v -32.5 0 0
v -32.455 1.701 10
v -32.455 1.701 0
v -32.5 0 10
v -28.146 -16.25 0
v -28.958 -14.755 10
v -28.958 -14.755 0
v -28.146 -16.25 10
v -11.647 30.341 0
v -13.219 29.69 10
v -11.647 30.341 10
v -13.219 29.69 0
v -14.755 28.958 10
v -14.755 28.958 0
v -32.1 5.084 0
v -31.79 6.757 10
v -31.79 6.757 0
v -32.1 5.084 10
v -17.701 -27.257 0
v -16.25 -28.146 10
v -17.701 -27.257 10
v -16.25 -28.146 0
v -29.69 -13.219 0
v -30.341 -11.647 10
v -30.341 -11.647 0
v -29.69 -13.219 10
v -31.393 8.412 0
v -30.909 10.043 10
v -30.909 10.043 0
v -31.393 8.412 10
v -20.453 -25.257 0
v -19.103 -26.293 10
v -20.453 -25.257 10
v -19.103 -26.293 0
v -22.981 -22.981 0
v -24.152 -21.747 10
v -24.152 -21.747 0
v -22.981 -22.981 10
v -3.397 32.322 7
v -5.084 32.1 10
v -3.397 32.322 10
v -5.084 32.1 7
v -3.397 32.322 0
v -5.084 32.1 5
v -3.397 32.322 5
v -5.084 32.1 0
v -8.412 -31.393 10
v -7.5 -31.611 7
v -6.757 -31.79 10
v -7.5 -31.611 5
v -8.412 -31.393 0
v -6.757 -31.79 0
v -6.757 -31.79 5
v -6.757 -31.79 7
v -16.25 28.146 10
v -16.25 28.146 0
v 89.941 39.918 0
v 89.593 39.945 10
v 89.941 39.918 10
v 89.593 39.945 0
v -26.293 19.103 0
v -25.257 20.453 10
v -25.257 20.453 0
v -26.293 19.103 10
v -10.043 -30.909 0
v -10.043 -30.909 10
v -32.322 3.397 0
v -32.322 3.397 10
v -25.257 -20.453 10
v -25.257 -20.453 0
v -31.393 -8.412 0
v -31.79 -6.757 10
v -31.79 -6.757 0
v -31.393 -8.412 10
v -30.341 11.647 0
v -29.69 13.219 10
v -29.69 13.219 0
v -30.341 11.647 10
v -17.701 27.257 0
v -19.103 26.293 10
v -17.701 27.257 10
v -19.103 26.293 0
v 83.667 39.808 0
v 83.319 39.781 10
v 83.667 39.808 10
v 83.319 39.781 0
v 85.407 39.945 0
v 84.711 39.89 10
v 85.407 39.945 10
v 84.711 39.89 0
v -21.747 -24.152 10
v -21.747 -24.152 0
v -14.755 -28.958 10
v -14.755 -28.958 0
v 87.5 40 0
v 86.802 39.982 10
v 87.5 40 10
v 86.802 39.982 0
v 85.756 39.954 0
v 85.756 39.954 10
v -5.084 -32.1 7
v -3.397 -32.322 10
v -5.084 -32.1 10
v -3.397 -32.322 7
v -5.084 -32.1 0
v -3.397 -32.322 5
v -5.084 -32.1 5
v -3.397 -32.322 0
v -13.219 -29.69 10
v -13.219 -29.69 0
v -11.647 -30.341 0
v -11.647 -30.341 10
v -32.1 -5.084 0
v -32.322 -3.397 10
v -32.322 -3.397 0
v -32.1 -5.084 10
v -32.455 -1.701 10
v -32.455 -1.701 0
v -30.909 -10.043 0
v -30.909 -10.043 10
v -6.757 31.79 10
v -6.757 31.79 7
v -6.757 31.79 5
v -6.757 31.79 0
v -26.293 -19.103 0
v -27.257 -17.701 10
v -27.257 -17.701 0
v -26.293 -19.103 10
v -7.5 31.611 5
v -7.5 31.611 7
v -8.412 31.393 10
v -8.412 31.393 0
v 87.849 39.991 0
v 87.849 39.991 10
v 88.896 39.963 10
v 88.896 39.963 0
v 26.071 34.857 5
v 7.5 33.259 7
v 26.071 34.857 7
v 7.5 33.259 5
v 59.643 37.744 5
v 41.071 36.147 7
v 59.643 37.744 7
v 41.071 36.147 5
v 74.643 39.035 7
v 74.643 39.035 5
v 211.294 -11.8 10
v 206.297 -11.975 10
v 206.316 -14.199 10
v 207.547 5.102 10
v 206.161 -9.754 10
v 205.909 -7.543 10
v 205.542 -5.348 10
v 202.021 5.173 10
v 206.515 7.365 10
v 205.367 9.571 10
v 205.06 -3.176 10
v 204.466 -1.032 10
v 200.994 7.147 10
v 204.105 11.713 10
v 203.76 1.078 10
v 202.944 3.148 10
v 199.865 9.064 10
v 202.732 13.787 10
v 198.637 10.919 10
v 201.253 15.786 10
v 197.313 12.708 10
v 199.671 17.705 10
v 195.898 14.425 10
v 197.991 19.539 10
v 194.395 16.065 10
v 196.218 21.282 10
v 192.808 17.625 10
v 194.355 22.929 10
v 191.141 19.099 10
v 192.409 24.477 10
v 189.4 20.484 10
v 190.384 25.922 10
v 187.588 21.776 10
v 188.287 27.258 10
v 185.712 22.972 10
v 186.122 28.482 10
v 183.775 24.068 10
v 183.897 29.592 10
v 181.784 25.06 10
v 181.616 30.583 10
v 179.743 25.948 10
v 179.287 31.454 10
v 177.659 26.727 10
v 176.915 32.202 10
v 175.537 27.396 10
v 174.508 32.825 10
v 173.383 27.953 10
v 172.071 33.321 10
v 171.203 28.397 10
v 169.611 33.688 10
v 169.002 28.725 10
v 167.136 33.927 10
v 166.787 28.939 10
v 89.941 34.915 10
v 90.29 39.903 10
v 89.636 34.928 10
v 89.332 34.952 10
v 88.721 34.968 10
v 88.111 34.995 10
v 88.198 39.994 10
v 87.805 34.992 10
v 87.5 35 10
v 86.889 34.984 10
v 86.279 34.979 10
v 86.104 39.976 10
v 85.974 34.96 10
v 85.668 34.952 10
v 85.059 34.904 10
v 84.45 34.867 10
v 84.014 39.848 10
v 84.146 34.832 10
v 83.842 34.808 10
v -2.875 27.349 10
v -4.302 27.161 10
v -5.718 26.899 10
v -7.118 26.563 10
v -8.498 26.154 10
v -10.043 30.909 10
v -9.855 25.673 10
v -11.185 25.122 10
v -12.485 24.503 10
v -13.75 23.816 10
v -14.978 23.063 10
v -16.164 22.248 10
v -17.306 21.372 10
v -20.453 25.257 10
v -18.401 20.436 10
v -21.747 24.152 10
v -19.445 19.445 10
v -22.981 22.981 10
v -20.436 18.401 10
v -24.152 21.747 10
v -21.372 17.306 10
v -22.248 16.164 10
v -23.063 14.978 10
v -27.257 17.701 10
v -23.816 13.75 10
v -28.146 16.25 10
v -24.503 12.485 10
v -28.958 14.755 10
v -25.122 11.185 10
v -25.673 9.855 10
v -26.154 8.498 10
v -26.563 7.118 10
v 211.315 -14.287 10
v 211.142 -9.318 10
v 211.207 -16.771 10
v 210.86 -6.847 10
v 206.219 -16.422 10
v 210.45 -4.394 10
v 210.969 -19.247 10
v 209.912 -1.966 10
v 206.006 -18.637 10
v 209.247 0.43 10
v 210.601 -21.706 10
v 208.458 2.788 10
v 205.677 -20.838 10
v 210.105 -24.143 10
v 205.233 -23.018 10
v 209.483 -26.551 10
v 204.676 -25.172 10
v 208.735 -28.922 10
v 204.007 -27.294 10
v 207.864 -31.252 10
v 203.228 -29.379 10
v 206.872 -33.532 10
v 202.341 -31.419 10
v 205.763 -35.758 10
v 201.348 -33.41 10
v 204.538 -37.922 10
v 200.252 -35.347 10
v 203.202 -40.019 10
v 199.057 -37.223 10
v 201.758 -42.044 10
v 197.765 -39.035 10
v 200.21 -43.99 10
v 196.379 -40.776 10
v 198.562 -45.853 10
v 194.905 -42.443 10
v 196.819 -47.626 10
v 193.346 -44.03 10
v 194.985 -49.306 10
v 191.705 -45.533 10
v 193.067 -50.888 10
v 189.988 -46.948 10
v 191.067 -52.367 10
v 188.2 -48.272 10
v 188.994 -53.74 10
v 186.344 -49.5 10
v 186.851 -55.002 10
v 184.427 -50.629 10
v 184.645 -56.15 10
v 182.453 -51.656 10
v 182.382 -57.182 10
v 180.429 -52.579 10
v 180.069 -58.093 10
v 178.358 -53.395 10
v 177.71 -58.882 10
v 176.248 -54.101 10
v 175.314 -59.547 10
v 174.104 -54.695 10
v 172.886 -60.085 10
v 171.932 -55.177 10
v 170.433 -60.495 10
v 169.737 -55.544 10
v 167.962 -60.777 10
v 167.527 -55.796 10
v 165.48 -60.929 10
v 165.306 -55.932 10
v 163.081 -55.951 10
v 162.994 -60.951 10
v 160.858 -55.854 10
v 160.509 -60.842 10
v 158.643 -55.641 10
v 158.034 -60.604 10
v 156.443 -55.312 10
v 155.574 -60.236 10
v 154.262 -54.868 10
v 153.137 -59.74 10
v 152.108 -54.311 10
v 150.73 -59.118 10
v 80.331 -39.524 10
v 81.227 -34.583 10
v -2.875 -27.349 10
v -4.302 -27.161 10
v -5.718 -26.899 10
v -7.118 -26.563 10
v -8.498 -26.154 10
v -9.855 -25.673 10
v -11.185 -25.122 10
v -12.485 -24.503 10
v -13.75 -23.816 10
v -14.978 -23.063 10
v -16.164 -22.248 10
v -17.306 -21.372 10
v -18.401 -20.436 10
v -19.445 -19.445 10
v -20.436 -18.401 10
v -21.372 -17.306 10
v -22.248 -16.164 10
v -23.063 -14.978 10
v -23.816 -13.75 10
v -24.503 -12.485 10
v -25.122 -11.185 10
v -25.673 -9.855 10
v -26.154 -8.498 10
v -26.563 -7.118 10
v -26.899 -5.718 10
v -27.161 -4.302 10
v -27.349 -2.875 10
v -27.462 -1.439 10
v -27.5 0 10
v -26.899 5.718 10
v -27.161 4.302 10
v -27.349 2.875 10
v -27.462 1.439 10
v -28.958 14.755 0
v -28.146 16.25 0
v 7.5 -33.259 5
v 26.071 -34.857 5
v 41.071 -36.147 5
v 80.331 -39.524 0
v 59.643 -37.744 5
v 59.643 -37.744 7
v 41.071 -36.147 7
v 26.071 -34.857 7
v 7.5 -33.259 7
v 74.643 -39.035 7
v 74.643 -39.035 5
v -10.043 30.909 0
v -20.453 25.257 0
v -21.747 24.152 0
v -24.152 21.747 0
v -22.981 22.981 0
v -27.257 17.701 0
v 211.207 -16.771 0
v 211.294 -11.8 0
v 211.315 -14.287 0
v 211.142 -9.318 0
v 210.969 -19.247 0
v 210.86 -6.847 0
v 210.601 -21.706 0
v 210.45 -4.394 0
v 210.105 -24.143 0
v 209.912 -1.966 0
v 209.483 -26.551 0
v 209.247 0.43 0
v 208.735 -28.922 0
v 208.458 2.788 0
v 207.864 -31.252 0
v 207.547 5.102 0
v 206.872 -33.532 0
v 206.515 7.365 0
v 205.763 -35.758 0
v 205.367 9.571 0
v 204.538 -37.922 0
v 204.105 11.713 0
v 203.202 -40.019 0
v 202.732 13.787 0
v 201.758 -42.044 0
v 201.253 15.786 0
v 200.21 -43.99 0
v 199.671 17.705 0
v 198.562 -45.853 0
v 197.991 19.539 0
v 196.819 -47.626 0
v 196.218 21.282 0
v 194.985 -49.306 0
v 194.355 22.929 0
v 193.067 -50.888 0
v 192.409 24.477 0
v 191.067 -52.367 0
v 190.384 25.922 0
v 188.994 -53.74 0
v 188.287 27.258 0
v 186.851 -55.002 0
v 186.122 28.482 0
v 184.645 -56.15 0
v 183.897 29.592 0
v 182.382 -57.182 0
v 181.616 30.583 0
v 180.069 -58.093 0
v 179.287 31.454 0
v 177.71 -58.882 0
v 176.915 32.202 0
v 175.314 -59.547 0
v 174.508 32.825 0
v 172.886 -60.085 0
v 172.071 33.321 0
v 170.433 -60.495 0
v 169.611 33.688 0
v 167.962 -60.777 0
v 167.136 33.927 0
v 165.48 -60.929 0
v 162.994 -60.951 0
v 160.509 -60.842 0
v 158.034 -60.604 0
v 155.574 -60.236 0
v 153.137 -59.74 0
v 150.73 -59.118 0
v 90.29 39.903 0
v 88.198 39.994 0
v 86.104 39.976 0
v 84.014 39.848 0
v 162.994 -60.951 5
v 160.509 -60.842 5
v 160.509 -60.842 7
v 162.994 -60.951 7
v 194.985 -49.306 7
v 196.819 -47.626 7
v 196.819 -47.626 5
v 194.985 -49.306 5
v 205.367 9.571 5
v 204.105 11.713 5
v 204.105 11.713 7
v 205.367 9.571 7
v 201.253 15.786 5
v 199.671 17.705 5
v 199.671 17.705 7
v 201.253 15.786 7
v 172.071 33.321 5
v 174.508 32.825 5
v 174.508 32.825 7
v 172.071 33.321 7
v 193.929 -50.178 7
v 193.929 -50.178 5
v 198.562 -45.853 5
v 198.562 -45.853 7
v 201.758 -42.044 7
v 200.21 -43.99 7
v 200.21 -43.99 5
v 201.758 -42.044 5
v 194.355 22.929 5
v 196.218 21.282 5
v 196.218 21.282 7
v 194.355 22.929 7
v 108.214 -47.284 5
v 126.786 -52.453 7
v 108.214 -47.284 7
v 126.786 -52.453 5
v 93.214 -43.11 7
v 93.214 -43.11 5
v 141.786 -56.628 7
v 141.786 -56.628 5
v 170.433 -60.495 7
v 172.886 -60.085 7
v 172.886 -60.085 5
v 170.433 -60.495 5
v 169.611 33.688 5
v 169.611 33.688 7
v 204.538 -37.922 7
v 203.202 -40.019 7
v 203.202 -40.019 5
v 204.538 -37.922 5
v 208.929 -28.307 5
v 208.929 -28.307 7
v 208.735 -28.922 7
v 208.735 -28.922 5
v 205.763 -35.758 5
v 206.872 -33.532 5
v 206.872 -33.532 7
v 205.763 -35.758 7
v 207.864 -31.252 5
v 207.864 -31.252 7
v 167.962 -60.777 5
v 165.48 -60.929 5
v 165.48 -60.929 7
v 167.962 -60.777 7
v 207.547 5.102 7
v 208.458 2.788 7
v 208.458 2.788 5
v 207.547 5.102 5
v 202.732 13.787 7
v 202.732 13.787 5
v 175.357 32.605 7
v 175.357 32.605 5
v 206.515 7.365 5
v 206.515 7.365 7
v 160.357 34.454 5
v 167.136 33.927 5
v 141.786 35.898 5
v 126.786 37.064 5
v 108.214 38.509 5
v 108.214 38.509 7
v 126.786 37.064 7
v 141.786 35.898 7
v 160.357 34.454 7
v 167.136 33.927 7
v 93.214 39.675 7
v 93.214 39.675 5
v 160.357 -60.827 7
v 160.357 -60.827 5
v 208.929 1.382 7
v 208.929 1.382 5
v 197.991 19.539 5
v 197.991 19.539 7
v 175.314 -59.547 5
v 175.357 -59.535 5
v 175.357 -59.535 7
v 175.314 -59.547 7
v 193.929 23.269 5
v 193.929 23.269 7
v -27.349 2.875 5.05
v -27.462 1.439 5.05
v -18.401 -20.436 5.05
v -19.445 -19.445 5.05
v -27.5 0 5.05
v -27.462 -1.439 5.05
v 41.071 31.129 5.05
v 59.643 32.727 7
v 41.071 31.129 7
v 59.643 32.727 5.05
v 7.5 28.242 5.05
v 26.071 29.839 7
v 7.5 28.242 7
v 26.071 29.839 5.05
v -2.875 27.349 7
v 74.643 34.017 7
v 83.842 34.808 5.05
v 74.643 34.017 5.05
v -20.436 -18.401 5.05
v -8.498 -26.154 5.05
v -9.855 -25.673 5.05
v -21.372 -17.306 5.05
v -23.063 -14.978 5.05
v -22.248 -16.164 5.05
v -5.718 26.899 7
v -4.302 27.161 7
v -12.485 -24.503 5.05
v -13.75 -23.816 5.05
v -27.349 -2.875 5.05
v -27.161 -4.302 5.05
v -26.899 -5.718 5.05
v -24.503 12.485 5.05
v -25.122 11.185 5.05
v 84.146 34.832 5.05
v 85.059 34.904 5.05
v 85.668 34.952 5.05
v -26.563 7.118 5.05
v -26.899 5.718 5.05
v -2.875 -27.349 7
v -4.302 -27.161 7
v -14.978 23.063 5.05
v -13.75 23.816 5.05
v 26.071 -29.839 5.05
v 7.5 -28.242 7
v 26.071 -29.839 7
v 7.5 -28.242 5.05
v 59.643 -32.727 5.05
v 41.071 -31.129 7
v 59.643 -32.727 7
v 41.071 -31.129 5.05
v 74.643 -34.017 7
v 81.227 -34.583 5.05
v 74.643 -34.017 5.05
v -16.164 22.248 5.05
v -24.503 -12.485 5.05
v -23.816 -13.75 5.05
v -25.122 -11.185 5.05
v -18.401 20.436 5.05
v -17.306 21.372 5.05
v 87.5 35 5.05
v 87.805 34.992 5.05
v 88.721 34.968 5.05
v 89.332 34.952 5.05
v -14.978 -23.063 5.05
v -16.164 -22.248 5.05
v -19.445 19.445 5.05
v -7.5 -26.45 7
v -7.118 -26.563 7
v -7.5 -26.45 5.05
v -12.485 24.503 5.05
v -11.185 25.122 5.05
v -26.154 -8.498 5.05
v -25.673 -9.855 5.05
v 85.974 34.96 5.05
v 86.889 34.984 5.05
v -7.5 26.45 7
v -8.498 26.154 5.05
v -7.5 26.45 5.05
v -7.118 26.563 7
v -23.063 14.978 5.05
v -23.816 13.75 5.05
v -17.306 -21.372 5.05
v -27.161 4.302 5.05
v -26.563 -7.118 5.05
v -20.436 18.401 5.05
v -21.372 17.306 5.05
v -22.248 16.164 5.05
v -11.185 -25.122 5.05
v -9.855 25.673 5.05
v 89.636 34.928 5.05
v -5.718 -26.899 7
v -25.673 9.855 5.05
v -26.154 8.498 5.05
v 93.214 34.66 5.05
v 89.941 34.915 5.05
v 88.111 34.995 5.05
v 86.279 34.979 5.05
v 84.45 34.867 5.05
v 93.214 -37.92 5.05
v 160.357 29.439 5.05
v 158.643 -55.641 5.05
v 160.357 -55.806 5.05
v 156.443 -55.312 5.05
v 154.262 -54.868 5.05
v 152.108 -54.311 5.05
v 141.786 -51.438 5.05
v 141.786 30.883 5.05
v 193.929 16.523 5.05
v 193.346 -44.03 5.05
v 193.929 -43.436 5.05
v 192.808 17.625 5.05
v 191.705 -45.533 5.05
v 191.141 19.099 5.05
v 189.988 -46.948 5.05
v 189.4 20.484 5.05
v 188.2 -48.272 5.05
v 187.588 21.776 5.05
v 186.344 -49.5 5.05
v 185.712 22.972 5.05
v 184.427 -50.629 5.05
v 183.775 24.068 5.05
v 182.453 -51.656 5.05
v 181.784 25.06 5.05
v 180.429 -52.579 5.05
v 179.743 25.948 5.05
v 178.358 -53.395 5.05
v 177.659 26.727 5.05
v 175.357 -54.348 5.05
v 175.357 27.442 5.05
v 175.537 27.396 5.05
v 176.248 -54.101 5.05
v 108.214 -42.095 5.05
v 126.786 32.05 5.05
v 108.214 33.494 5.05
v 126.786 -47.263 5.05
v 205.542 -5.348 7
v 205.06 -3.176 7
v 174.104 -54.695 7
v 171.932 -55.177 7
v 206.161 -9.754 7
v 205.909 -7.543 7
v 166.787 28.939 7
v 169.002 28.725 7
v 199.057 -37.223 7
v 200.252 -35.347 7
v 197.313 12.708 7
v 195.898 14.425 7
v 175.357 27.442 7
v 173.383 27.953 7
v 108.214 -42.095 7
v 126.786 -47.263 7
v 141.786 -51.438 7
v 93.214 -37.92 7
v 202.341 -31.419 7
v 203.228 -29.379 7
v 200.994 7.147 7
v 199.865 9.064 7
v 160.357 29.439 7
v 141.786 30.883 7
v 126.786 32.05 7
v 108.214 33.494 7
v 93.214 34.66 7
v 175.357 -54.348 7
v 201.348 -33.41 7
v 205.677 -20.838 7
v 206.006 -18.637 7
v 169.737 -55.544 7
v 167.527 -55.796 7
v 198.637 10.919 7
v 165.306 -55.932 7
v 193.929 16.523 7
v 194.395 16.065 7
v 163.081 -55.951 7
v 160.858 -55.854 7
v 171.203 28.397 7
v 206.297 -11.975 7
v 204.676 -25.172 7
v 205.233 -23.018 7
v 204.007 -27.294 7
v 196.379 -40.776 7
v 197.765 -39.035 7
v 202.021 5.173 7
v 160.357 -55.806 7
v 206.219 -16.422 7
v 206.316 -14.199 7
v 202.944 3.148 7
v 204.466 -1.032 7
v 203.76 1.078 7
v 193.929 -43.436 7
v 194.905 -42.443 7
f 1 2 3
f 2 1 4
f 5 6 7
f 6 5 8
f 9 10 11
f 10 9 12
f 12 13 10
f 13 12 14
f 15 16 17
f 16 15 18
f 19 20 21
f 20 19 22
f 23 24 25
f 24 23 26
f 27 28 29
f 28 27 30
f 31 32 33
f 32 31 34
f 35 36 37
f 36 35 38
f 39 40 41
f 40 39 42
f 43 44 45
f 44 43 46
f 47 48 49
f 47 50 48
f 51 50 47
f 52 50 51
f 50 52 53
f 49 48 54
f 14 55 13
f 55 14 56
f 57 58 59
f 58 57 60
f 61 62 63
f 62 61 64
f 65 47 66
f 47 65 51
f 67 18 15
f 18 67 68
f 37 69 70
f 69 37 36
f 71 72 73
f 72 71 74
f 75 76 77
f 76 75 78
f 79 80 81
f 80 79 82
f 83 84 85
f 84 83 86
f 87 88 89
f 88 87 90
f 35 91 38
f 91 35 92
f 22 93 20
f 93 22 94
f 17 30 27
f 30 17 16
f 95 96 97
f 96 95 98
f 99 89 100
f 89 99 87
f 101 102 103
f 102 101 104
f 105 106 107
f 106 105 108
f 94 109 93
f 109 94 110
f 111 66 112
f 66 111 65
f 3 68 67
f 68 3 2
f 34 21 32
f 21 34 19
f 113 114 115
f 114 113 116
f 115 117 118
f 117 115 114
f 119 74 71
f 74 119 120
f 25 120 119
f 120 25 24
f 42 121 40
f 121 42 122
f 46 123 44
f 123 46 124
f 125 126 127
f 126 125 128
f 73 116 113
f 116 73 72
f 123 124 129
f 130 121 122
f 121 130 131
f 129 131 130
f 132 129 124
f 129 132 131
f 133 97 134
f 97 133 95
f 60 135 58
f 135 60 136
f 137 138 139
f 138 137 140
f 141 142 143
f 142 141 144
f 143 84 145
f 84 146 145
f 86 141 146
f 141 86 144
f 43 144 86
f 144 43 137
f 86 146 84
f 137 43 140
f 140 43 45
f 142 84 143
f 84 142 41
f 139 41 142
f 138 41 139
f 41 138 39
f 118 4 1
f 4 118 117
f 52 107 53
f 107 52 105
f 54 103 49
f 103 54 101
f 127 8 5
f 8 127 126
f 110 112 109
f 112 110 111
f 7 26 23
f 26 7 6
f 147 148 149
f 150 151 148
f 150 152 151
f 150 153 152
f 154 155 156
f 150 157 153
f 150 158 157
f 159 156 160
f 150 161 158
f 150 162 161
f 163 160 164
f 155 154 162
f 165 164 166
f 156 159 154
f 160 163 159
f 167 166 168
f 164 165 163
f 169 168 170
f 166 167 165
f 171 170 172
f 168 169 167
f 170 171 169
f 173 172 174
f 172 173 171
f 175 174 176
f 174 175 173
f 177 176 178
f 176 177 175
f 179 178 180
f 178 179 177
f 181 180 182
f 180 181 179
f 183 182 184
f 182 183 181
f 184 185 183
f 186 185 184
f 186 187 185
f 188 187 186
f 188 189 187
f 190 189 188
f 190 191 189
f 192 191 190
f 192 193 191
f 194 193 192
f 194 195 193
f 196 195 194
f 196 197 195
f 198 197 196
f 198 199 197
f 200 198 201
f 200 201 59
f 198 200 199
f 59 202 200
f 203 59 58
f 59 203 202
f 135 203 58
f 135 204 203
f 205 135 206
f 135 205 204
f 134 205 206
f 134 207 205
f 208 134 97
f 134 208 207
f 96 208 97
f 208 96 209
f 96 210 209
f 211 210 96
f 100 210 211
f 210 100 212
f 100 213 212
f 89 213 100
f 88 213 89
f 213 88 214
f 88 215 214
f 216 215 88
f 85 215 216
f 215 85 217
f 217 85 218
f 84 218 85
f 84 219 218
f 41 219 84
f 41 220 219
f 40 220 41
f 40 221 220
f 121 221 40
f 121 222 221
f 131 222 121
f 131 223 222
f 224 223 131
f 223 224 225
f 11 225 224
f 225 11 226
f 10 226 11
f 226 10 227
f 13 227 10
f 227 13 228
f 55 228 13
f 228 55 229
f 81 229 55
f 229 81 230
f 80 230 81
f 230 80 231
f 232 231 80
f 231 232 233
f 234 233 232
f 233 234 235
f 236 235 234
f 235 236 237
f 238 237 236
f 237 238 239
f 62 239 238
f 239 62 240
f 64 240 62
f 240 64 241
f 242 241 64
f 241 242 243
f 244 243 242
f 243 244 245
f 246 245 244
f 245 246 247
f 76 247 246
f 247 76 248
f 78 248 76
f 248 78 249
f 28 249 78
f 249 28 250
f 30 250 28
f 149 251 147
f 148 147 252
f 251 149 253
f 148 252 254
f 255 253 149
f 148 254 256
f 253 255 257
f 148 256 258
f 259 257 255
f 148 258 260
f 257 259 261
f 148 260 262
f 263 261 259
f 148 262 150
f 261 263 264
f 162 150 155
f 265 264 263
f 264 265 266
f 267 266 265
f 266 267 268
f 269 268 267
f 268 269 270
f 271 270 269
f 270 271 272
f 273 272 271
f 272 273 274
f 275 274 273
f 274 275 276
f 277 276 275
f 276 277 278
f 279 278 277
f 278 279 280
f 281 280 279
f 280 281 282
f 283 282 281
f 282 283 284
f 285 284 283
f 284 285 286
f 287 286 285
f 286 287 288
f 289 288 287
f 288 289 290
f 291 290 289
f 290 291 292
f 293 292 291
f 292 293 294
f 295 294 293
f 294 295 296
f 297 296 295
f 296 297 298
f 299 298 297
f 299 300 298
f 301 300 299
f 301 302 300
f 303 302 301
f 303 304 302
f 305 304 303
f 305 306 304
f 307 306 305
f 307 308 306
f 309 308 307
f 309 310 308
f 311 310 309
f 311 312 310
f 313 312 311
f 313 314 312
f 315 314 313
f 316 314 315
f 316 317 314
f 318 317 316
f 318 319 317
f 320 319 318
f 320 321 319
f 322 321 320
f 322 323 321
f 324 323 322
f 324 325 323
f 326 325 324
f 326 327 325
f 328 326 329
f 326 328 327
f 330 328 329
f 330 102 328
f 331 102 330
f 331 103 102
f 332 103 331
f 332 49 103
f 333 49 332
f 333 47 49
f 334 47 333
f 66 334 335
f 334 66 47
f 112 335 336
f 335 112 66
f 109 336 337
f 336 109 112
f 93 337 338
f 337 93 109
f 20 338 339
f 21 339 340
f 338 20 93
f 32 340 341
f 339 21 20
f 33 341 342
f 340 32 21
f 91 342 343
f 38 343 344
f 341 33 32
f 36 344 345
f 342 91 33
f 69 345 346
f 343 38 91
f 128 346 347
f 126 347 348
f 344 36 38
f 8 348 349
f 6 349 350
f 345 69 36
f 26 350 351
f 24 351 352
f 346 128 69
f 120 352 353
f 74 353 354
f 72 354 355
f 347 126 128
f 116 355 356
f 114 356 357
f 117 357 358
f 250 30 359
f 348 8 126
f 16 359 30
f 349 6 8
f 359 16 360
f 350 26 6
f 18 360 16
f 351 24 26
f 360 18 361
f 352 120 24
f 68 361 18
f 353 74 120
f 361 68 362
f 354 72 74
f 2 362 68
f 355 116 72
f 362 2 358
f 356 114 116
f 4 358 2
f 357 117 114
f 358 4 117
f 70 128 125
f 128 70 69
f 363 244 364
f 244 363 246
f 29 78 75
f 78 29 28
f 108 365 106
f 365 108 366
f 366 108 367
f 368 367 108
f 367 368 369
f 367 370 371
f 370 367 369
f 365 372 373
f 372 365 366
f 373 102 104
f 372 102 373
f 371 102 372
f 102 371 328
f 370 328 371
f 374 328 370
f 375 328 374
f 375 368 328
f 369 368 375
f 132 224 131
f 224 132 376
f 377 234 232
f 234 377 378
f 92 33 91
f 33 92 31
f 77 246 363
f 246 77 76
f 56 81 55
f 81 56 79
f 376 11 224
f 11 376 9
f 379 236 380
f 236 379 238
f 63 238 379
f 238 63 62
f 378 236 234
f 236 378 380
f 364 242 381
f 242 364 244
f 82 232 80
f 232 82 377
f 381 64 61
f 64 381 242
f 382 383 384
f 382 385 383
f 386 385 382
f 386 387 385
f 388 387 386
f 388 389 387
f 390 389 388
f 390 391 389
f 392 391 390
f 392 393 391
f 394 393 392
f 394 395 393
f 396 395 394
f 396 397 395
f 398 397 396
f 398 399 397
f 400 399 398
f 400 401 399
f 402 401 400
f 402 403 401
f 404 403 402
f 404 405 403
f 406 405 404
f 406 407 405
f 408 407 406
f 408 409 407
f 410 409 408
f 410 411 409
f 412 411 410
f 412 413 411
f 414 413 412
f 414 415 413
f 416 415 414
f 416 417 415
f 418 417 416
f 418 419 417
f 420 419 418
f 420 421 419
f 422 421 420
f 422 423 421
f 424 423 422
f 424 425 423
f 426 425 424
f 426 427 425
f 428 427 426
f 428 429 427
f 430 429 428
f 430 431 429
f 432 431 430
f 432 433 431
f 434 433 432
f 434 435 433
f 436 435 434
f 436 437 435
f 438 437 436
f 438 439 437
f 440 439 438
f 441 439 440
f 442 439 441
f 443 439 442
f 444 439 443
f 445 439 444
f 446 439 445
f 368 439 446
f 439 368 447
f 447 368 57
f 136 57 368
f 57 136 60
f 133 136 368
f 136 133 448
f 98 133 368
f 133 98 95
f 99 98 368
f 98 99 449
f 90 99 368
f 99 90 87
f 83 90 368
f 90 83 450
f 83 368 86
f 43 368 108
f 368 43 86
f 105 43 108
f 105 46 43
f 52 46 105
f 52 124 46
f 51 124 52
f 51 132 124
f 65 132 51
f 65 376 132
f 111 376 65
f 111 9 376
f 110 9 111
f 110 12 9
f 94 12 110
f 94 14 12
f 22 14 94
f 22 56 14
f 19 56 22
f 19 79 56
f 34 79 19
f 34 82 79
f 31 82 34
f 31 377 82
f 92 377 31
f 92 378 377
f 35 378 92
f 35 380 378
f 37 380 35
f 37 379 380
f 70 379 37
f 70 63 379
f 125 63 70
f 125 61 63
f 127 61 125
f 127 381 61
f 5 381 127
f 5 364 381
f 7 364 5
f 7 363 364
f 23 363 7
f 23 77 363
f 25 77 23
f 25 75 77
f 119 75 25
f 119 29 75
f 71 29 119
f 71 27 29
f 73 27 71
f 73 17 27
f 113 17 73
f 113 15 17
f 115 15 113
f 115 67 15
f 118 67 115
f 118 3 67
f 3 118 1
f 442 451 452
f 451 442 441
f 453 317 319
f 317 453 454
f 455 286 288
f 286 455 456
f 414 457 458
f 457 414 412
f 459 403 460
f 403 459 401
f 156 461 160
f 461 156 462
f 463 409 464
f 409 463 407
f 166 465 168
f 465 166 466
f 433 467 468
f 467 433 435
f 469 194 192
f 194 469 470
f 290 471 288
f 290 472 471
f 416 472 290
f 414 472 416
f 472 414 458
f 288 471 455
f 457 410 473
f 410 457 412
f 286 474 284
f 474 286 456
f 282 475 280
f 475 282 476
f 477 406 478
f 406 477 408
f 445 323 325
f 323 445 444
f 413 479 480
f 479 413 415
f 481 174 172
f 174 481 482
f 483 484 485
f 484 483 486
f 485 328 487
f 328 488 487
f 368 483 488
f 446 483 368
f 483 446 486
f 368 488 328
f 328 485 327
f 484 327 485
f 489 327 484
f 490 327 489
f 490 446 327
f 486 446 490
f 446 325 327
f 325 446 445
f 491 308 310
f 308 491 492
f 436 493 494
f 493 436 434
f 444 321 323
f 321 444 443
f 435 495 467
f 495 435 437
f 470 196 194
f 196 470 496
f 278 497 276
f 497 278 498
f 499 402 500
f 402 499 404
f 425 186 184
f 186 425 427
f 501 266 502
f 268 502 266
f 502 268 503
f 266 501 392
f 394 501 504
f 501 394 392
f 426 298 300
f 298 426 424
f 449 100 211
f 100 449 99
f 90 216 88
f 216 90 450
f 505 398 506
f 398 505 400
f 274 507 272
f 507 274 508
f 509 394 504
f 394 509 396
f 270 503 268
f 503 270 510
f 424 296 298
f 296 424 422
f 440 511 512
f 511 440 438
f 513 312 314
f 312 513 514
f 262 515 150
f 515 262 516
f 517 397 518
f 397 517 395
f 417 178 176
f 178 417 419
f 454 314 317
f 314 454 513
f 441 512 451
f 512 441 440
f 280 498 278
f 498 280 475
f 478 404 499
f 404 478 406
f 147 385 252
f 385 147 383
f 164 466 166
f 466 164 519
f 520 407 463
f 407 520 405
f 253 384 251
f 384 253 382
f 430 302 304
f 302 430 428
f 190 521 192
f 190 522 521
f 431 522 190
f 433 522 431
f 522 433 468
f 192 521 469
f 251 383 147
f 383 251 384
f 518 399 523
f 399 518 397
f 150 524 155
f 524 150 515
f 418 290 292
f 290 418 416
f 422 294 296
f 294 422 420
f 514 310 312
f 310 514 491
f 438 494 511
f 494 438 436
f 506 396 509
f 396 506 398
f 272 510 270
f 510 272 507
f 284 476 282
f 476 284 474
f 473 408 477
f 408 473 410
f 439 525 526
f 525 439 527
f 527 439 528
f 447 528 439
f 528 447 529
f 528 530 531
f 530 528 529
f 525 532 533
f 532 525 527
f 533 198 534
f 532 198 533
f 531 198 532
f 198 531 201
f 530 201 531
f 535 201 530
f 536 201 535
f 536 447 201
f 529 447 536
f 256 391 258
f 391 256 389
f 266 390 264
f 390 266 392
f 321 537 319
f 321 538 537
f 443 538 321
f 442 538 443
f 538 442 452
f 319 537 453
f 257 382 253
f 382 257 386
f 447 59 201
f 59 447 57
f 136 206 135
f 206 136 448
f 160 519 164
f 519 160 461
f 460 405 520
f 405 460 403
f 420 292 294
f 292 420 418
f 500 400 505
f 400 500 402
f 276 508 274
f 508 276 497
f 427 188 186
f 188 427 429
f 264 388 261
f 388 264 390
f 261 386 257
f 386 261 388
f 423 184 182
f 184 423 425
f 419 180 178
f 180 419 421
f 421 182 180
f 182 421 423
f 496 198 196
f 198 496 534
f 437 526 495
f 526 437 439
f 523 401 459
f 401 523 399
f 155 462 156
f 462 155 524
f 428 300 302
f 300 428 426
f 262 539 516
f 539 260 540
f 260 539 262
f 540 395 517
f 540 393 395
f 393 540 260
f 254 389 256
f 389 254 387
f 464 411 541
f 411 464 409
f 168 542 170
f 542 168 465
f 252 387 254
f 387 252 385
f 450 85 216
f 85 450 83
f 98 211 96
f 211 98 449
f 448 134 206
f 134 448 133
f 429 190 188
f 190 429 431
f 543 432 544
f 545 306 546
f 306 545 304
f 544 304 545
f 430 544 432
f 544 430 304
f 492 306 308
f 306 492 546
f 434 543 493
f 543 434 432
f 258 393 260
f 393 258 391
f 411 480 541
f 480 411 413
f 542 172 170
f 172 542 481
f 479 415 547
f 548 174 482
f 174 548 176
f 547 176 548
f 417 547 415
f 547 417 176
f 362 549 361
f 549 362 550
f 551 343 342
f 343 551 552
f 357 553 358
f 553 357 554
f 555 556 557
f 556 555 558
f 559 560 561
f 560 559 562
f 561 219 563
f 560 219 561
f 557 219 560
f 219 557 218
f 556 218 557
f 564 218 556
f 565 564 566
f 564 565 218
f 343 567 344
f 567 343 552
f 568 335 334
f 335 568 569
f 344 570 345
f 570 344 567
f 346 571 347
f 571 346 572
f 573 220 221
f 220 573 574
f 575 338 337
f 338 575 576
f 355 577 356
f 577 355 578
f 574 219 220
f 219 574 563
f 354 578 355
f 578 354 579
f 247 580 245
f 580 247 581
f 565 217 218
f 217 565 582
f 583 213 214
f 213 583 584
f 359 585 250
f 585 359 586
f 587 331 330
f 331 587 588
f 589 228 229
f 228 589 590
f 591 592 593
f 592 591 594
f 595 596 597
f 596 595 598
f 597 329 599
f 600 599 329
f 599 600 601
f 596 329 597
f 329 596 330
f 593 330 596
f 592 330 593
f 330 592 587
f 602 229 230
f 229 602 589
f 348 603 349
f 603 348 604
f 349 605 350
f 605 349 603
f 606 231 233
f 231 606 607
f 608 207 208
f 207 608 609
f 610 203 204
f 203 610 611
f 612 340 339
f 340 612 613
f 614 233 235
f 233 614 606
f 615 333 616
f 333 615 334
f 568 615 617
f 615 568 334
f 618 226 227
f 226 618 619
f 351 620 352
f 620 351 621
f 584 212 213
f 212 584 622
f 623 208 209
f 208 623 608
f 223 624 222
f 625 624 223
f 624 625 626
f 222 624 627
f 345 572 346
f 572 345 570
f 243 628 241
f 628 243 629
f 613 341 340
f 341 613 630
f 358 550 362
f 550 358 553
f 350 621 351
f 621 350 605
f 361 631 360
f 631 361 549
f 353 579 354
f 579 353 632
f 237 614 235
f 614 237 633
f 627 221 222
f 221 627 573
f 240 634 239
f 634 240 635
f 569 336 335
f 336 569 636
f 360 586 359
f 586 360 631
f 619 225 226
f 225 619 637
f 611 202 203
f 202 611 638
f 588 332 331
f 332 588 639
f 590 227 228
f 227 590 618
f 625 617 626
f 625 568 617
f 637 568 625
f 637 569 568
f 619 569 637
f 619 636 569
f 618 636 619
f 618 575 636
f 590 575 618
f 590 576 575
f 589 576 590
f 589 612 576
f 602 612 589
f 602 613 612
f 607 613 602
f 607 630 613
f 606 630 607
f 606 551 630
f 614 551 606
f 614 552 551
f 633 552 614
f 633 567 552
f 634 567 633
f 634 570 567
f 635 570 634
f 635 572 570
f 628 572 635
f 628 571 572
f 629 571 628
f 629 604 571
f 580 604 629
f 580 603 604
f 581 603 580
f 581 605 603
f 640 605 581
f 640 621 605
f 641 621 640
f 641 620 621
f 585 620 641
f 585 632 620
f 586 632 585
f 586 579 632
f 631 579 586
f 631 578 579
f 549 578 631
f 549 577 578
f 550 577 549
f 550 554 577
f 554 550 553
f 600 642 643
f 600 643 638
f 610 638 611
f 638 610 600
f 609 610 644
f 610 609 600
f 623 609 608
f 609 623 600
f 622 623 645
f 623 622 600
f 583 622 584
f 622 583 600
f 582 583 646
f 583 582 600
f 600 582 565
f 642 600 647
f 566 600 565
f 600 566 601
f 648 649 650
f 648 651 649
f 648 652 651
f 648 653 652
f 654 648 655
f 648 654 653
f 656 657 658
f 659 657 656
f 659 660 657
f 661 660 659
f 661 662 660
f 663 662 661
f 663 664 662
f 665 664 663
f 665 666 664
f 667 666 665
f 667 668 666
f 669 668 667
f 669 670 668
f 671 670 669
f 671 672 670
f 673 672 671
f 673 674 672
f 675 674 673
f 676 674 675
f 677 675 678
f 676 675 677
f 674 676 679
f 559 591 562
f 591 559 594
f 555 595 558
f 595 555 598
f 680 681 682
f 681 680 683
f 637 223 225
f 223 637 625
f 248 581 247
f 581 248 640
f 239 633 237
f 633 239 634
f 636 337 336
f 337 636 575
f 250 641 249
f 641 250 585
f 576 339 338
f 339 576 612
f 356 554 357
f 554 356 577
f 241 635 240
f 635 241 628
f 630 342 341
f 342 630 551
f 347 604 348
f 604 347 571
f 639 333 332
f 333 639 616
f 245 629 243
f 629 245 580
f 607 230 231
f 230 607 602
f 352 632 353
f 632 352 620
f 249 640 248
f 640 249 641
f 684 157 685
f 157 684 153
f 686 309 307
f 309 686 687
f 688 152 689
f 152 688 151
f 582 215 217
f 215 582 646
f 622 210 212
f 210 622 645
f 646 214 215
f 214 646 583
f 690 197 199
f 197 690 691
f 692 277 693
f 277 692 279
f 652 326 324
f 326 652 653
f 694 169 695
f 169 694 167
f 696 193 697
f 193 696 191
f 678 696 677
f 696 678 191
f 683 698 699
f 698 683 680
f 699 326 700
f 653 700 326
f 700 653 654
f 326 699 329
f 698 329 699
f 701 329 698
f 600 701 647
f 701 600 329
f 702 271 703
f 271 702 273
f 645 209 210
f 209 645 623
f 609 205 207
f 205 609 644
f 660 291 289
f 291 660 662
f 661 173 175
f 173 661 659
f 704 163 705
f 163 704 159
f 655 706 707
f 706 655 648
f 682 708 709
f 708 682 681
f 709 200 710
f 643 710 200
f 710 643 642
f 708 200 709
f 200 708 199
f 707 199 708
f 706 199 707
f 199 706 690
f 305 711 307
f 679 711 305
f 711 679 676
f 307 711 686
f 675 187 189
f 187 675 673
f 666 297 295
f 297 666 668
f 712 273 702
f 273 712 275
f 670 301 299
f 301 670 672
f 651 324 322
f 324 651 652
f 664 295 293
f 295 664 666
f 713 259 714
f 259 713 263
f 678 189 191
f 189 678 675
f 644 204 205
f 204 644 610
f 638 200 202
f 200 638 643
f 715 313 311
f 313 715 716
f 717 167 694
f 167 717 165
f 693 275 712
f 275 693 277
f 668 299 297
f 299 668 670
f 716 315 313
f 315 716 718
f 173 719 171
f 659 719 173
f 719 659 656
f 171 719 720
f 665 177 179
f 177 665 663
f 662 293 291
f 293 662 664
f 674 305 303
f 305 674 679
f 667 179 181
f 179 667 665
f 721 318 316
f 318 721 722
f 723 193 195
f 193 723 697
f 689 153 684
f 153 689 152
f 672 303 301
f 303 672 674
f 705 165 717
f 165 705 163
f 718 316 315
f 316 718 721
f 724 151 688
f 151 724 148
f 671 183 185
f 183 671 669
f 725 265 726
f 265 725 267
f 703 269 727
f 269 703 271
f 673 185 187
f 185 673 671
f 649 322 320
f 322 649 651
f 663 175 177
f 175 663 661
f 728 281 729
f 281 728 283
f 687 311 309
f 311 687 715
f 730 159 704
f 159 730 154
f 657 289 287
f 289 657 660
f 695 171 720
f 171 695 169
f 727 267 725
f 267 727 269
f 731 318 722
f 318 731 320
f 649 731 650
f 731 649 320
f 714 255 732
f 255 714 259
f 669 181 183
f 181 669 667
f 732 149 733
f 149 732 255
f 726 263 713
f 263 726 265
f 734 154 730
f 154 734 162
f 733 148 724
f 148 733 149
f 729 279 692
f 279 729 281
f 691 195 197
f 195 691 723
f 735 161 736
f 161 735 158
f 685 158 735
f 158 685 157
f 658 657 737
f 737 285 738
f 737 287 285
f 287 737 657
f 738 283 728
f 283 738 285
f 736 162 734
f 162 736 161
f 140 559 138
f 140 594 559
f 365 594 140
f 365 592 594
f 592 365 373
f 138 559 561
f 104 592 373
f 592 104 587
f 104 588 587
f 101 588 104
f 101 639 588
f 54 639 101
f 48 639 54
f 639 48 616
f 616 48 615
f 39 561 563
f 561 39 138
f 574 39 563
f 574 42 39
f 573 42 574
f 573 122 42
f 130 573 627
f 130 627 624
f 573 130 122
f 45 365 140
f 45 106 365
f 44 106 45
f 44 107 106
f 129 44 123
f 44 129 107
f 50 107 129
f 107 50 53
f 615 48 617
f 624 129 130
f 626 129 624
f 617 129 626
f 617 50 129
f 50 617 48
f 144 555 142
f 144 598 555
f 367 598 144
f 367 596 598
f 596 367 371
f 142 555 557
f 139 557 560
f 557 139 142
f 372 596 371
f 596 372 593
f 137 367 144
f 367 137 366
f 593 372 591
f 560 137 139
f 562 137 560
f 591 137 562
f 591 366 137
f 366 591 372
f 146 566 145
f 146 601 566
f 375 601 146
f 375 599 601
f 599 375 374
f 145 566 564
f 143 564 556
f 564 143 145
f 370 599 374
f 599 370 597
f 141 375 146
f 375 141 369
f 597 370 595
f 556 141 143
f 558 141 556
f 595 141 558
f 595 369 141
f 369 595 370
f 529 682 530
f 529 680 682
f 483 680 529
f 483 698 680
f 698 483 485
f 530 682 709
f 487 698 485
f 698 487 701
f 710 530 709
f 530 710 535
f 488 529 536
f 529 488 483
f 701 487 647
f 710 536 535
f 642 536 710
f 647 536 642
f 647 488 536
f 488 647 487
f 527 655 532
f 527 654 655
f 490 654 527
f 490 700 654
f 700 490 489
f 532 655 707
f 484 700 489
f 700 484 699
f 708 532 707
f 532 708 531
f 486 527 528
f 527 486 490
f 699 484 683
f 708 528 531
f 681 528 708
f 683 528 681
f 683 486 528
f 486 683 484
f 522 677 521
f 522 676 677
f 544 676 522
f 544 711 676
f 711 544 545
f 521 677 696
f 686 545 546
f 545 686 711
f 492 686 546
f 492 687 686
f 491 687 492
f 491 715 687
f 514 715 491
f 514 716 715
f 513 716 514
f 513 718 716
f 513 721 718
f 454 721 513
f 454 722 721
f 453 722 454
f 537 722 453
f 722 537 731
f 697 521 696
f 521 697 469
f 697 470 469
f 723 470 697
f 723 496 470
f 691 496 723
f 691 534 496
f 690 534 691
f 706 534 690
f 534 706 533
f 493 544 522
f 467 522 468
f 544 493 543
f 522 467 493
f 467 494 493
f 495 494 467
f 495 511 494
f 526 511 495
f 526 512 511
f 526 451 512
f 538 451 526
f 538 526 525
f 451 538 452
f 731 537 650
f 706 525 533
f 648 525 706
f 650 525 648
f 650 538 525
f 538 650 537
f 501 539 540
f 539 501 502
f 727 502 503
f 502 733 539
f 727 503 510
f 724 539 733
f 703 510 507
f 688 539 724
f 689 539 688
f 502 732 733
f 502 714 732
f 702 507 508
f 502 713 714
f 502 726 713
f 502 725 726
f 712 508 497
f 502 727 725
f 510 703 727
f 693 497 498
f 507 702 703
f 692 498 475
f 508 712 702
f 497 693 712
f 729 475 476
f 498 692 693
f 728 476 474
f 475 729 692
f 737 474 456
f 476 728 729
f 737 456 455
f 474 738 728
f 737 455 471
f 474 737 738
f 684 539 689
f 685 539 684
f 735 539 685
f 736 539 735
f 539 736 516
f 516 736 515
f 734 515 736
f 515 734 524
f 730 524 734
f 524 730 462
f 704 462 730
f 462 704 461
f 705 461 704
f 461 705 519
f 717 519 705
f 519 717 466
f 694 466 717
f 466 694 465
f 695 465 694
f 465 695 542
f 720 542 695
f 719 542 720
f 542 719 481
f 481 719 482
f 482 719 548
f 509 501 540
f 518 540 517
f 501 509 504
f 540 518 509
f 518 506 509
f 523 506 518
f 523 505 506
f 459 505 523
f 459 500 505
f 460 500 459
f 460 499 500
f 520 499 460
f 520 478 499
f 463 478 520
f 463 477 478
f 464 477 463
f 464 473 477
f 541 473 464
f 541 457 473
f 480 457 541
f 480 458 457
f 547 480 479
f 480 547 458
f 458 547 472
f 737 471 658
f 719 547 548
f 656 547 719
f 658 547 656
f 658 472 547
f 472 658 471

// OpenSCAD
// Cleat-guard sole prototype
// All dimensions in millimeters.

HEEL_WIDTH = 55;
PAD_WIDTH = 85;
SOLE_THICKNESS = 5;
LENGTH = 235;
INSTEP_WIDTH = 70;
INSTEP_LENGTH = 150;
ANGLE = -10;

WALL = 5;

NUM_HOLES = 7;
STRAP_WIDTH = 15;
STRAP_THICKNESS = 2;

// Centers
HEEL_CENTER = 0;
INSTEP_CENTER = HEEL_CENTER + INSTEP_LENGTH - INSTEP_WIDTH / 2 - HEEL_WIDTH / 2;
PAD_CENTER = HEEL_CENTER + LENGTH - HEEL_WIDTH / 2 - PAD_WIDTH / 2;

// Epsilon
E = 0.05;

$fa=3;
$fs=1;

module sole(thickness, extra) {
  hull() {
    translate([HEEL_CENTER, 0, 0])
      cylinder(r=HEEL_WIDTH / 2 + extra, h=thickness);
    translate([INSTEP_CENTER, 0, 0])
      cylinder(r=INSTEP_WIDTH / 2 + extra, h=thickness);
  }
  translate([INSTEP_CENTER, 0, 0])
    rotate(a=ANGLE, v=[0, 0, 1])
    hull () {
      cylinder(r=INSTEP_WIDTH / 2 + extra, h=thickness);
      translate([PAD_CENTER - INSTEP_CENTER, 0, 0])
        cylinder(r=PAD_WIDTH / 2 + extra, h=thickness);
    }
}

difference() {
  sole(SOLE_THICKNESS * 2, WALL);
  translate([0, 0, SOLE_THICKNESS + E])
    sole(SOLE_THICKNESS, 0);
  translate([0, 0, 2 * SOLE_THICKNESS - 2 * STRAP_THICKNESS])
    for (i = [0 : NUM_HOLES - 1]) {
      translate([i * (LENGTH / NUM_HOLES), 0, 0])
        cube([STRAP_WIDTH, 2 * PAD_WIDTH, STRAP_THICKNESS], center=true);
    }
}
